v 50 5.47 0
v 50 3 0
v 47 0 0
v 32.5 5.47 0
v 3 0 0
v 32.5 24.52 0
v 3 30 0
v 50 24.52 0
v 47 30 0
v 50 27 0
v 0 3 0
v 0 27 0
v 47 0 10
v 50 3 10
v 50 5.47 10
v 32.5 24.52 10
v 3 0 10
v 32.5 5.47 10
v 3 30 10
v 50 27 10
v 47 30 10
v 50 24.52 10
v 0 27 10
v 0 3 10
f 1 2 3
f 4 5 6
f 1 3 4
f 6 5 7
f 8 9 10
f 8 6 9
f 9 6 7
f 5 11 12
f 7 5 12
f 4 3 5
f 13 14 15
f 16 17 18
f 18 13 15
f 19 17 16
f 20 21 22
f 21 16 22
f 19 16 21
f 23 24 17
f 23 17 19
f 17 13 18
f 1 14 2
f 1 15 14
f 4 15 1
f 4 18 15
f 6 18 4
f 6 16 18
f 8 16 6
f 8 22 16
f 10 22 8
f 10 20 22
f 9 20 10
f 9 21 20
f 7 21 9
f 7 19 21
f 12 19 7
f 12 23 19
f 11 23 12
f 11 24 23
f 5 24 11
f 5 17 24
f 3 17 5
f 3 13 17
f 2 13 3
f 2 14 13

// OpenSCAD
$fn = 32;

// ----------------------------------------------------------------------
// C washer: 50 x 30 mm plate with an open slot
// ----------------------------------------------------------------------

// --- parameters (mm) ---
profile_height = 10;      // extrusion height
profile_points = 12;      // points of the closed outline

profile = [[3, 0], [47, 0], [50, 3], [50, 5.47], [32.5, 5.47], [32.5, 24.52], [50, 24.52], [50, 27], [47, 30], [3, 30], [0, 27], [0, 3]];  // single closed polygon, 12 points, counter clockwise

// --- the one profile operation ---
linear_extrude(height = profile_height) polygon(points = profile);
